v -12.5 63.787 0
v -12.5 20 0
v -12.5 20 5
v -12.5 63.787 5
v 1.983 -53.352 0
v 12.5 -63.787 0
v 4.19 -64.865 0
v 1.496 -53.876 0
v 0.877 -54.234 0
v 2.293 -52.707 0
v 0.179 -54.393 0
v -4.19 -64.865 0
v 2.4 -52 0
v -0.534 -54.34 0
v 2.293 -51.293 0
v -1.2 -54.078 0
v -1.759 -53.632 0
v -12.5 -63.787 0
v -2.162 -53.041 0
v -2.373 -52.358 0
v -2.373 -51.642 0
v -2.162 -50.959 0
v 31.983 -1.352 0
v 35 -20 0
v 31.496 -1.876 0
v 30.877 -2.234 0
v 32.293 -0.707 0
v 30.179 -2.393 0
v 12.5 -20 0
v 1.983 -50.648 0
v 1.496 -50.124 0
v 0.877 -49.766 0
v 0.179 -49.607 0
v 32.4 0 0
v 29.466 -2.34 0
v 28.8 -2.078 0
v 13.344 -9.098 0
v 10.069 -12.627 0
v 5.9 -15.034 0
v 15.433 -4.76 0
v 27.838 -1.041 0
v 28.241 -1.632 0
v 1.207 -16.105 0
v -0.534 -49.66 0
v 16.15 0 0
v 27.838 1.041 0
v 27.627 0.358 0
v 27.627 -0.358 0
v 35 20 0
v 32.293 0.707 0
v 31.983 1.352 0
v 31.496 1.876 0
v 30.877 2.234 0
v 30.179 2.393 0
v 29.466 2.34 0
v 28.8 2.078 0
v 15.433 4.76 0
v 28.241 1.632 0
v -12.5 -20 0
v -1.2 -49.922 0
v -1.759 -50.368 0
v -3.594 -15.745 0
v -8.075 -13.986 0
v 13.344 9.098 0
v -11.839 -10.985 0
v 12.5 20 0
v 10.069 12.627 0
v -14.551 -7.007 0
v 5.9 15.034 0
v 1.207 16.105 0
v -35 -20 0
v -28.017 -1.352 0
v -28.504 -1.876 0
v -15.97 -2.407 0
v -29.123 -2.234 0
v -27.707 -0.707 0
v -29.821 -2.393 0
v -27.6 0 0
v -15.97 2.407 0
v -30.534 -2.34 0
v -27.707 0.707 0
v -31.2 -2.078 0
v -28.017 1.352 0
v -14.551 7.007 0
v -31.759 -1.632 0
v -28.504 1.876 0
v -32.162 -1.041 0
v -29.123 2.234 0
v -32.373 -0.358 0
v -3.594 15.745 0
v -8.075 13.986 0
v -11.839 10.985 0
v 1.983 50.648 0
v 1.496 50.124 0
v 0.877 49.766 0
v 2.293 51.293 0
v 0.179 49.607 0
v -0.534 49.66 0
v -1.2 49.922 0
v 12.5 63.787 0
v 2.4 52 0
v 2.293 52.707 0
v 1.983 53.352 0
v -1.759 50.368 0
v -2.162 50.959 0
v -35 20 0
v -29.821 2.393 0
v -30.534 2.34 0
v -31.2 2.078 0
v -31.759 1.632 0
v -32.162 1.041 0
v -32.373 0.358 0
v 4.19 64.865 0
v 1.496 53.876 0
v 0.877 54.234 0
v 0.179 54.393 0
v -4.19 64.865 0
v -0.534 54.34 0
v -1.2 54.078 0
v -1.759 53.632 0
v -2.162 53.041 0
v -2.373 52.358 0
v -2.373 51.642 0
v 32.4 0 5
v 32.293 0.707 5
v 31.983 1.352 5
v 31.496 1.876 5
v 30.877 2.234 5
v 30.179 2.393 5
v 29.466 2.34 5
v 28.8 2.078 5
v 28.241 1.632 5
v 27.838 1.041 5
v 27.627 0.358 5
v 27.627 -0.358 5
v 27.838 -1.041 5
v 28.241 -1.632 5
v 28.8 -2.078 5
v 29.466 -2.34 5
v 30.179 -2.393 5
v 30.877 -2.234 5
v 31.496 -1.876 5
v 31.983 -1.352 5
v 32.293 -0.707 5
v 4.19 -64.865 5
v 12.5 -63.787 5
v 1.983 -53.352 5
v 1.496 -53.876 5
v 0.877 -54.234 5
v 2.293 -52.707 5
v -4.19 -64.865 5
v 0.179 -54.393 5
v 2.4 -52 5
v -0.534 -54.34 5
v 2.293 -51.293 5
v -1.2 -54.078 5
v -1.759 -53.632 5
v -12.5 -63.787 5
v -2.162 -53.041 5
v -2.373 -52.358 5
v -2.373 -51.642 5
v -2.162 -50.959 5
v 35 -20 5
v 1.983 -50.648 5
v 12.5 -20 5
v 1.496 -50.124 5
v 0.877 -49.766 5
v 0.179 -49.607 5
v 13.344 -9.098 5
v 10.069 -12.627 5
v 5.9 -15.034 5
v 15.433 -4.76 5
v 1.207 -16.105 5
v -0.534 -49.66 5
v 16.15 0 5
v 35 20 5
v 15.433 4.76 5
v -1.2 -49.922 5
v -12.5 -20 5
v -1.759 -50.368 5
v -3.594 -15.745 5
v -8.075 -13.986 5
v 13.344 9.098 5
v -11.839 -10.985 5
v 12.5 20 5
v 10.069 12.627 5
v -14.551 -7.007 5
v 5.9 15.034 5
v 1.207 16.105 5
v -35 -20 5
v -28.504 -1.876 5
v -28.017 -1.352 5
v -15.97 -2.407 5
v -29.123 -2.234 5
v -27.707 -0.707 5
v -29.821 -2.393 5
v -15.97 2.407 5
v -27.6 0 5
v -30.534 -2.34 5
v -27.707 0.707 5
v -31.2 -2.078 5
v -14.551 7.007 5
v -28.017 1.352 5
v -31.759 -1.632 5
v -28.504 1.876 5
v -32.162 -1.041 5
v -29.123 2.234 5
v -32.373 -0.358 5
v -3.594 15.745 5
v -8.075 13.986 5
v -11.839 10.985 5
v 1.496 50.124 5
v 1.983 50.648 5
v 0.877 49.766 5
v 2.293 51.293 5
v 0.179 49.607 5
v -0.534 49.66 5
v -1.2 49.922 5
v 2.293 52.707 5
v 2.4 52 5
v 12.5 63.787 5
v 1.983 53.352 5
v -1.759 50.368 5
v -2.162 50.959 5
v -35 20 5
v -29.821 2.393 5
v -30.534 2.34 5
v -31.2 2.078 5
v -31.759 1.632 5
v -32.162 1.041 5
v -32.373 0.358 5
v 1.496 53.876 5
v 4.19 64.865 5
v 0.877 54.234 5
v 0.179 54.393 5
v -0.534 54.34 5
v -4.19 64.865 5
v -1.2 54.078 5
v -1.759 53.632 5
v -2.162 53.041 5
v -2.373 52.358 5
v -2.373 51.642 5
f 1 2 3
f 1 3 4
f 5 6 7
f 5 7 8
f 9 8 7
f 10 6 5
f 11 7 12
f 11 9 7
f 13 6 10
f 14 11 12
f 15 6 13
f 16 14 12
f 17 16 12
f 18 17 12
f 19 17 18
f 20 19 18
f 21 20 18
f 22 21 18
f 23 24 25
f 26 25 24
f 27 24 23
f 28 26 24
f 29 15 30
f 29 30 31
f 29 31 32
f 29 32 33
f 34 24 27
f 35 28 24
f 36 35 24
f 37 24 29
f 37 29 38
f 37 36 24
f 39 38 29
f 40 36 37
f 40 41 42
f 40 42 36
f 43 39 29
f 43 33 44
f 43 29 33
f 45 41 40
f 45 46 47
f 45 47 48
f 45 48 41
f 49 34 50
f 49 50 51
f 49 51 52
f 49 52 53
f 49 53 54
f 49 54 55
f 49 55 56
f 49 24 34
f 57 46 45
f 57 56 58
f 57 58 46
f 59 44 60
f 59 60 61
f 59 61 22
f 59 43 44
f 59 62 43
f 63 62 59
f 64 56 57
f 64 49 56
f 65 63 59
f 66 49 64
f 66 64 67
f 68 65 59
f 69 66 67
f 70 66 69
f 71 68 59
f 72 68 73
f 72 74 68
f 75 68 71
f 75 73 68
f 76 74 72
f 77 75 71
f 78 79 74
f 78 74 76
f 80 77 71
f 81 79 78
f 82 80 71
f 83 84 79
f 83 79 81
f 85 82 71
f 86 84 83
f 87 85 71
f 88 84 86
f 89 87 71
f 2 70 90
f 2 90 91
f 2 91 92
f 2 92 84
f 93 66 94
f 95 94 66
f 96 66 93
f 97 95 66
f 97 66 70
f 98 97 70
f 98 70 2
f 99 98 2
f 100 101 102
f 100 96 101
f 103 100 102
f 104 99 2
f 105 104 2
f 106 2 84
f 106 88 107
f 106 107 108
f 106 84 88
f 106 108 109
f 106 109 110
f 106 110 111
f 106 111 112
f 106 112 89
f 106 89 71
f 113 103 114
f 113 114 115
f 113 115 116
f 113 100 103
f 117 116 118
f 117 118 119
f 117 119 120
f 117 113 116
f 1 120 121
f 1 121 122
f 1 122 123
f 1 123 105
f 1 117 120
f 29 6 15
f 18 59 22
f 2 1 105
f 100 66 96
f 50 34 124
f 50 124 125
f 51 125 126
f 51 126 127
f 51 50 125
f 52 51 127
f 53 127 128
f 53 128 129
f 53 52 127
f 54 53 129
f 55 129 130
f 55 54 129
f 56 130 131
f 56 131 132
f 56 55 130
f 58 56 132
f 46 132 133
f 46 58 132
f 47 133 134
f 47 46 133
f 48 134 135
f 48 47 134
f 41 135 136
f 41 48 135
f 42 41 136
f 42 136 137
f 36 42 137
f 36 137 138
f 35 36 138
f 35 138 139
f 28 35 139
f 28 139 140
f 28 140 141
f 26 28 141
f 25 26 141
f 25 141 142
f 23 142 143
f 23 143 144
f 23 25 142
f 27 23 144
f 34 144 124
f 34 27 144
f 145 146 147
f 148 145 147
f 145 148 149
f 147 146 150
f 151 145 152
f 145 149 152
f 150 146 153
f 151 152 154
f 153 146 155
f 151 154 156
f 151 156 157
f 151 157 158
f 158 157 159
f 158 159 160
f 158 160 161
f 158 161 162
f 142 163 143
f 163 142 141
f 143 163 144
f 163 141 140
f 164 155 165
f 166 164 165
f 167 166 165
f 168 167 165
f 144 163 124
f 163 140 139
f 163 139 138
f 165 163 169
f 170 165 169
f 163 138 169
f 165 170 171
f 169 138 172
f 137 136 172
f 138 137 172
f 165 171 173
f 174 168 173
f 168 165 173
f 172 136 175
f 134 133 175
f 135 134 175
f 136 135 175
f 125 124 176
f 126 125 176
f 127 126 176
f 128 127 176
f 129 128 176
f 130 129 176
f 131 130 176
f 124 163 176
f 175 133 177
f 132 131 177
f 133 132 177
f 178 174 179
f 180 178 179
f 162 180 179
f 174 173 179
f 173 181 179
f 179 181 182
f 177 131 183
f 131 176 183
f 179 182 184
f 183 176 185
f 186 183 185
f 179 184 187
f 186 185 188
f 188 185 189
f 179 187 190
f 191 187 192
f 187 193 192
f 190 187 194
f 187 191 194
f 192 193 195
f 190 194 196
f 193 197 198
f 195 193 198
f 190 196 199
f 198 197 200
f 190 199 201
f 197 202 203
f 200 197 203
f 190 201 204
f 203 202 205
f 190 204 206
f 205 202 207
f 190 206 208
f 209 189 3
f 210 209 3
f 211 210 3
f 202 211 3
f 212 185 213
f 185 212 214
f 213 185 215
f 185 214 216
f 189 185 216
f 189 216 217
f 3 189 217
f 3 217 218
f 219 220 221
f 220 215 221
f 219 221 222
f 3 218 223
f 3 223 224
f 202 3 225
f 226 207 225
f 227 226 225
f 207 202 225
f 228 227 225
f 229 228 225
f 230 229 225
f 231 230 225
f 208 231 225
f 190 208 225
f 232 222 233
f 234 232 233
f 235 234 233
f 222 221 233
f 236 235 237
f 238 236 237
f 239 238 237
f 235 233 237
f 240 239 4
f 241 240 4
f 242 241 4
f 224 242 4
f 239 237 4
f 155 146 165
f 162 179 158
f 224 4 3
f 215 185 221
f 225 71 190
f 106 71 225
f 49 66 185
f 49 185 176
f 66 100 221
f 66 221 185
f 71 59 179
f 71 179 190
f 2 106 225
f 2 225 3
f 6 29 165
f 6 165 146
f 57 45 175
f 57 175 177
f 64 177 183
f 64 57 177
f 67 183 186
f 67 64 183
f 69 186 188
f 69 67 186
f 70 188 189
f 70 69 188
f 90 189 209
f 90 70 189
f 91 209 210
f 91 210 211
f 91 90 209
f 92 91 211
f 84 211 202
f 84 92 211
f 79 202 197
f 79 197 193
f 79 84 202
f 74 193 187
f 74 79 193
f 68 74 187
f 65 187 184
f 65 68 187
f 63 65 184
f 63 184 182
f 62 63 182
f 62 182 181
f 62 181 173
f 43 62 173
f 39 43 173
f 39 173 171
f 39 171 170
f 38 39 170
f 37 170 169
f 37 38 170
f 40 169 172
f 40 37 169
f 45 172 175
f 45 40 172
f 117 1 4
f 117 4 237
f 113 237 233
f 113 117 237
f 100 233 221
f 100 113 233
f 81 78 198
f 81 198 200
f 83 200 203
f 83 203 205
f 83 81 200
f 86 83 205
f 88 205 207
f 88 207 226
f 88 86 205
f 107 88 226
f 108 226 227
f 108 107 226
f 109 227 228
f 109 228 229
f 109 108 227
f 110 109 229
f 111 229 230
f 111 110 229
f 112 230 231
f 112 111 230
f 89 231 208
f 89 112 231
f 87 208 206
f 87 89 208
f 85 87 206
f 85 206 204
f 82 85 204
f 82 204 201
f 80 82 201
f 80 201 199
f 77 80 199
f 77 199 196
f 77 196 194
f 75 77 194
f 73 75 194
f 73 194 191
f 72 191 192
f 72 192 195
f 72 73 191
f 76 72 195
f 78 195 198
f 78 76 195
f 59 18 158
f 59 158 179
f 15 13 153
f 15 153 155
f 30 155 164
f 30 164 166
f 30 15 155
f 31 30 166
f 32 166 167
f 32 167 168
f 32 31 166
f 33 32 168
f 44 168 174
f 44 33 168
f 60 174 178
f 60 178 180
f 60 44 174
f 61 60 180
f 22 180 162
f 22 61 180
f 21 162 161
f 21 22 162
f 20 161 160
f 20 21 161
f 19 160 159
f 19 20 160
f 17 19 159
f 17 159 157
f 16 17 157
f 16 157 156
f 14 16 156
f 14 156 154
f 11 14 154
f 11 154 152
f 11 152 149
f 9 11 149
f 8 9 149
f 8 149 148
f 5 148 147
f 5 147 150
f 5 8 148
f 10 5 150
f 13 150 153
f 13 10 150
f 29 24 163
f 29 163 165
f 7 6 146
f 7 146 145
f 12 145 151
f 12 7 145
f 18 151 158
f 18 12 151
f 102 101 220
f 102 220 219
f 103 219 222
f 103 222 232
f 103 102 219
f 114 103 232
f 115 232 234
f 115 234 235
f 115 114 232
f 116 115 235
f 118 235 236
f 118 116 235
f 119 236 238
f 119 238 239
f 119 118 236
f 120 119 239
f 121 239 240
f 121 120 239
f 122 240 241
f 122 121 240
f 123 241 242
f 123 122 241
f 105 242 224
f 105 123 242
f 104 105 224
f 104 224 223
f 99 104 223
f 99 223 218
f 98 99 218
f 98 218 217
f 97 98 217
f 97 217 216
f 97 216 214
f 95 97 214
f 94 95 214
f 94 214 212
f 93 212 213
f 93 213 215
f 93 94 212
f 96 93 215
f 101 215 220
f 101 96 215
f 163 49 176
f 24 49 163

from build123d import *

# Parameters (mm, degrees)
SKETCH1_R           = 16.15
SKETCH1_R_2         = 2.4
BOSS_EXTRUDE1_DEPTH = 5


with BuildPart() as part:
    # Sketch1 → Boss-Extrude1 (new body)
    with BuildSketch(Plane.XY):
        with BuildLine():
            Line((12.5, 20), (35, 20))
            Line((35, 20), (35, 0))
            Line((35, 0), (35, -20))
            Line((35, -20), (12.5, -20))
            Line((12.5, -20), (12.5, -63.786754111))
            ThreePointArc((12.5, -63.786754111), (0, -65), (-12.5, -63.786754111))
            Line((-12.5, -63.786754111), (-12.5, -20))
            Line((-12.5, -20), (-35, -20))
            Line((-35, -20), (-35, 20))
            Line((-35, 20), (-12.5, 20))
            Line((-12.5, 20), (-12.5, 63.786754111))
            ThreePointArc((-12.5, 63.786754111), (0, 65), (12.5, 63.786754111))
            Line((12.5, 63.786754111), (12.5, 20))
        make_face()
        Circle(SKETCH1_R, mode=Mode.SUBTRACT)
        with Locations((0, 52)):
            Circle(SKETCH1_R_2, mode=Mode.SUBTRACT)
        with Locations((30, 0)):
            Circle(SKETCH1_R_2, mode=Mode.SUBTRACT)
        with Locations((0, -52)):
            Circle(SKETCH1_R_2, mode=Mode.SUBTRACT)
        with Locations((-30, 0)):
            Circle(SKETCH1_R_2, mode=Mode.SUBTRACT)
    extrude(amount=BOSS_EXTRUDE1_DEPTH)


solid = part.part
